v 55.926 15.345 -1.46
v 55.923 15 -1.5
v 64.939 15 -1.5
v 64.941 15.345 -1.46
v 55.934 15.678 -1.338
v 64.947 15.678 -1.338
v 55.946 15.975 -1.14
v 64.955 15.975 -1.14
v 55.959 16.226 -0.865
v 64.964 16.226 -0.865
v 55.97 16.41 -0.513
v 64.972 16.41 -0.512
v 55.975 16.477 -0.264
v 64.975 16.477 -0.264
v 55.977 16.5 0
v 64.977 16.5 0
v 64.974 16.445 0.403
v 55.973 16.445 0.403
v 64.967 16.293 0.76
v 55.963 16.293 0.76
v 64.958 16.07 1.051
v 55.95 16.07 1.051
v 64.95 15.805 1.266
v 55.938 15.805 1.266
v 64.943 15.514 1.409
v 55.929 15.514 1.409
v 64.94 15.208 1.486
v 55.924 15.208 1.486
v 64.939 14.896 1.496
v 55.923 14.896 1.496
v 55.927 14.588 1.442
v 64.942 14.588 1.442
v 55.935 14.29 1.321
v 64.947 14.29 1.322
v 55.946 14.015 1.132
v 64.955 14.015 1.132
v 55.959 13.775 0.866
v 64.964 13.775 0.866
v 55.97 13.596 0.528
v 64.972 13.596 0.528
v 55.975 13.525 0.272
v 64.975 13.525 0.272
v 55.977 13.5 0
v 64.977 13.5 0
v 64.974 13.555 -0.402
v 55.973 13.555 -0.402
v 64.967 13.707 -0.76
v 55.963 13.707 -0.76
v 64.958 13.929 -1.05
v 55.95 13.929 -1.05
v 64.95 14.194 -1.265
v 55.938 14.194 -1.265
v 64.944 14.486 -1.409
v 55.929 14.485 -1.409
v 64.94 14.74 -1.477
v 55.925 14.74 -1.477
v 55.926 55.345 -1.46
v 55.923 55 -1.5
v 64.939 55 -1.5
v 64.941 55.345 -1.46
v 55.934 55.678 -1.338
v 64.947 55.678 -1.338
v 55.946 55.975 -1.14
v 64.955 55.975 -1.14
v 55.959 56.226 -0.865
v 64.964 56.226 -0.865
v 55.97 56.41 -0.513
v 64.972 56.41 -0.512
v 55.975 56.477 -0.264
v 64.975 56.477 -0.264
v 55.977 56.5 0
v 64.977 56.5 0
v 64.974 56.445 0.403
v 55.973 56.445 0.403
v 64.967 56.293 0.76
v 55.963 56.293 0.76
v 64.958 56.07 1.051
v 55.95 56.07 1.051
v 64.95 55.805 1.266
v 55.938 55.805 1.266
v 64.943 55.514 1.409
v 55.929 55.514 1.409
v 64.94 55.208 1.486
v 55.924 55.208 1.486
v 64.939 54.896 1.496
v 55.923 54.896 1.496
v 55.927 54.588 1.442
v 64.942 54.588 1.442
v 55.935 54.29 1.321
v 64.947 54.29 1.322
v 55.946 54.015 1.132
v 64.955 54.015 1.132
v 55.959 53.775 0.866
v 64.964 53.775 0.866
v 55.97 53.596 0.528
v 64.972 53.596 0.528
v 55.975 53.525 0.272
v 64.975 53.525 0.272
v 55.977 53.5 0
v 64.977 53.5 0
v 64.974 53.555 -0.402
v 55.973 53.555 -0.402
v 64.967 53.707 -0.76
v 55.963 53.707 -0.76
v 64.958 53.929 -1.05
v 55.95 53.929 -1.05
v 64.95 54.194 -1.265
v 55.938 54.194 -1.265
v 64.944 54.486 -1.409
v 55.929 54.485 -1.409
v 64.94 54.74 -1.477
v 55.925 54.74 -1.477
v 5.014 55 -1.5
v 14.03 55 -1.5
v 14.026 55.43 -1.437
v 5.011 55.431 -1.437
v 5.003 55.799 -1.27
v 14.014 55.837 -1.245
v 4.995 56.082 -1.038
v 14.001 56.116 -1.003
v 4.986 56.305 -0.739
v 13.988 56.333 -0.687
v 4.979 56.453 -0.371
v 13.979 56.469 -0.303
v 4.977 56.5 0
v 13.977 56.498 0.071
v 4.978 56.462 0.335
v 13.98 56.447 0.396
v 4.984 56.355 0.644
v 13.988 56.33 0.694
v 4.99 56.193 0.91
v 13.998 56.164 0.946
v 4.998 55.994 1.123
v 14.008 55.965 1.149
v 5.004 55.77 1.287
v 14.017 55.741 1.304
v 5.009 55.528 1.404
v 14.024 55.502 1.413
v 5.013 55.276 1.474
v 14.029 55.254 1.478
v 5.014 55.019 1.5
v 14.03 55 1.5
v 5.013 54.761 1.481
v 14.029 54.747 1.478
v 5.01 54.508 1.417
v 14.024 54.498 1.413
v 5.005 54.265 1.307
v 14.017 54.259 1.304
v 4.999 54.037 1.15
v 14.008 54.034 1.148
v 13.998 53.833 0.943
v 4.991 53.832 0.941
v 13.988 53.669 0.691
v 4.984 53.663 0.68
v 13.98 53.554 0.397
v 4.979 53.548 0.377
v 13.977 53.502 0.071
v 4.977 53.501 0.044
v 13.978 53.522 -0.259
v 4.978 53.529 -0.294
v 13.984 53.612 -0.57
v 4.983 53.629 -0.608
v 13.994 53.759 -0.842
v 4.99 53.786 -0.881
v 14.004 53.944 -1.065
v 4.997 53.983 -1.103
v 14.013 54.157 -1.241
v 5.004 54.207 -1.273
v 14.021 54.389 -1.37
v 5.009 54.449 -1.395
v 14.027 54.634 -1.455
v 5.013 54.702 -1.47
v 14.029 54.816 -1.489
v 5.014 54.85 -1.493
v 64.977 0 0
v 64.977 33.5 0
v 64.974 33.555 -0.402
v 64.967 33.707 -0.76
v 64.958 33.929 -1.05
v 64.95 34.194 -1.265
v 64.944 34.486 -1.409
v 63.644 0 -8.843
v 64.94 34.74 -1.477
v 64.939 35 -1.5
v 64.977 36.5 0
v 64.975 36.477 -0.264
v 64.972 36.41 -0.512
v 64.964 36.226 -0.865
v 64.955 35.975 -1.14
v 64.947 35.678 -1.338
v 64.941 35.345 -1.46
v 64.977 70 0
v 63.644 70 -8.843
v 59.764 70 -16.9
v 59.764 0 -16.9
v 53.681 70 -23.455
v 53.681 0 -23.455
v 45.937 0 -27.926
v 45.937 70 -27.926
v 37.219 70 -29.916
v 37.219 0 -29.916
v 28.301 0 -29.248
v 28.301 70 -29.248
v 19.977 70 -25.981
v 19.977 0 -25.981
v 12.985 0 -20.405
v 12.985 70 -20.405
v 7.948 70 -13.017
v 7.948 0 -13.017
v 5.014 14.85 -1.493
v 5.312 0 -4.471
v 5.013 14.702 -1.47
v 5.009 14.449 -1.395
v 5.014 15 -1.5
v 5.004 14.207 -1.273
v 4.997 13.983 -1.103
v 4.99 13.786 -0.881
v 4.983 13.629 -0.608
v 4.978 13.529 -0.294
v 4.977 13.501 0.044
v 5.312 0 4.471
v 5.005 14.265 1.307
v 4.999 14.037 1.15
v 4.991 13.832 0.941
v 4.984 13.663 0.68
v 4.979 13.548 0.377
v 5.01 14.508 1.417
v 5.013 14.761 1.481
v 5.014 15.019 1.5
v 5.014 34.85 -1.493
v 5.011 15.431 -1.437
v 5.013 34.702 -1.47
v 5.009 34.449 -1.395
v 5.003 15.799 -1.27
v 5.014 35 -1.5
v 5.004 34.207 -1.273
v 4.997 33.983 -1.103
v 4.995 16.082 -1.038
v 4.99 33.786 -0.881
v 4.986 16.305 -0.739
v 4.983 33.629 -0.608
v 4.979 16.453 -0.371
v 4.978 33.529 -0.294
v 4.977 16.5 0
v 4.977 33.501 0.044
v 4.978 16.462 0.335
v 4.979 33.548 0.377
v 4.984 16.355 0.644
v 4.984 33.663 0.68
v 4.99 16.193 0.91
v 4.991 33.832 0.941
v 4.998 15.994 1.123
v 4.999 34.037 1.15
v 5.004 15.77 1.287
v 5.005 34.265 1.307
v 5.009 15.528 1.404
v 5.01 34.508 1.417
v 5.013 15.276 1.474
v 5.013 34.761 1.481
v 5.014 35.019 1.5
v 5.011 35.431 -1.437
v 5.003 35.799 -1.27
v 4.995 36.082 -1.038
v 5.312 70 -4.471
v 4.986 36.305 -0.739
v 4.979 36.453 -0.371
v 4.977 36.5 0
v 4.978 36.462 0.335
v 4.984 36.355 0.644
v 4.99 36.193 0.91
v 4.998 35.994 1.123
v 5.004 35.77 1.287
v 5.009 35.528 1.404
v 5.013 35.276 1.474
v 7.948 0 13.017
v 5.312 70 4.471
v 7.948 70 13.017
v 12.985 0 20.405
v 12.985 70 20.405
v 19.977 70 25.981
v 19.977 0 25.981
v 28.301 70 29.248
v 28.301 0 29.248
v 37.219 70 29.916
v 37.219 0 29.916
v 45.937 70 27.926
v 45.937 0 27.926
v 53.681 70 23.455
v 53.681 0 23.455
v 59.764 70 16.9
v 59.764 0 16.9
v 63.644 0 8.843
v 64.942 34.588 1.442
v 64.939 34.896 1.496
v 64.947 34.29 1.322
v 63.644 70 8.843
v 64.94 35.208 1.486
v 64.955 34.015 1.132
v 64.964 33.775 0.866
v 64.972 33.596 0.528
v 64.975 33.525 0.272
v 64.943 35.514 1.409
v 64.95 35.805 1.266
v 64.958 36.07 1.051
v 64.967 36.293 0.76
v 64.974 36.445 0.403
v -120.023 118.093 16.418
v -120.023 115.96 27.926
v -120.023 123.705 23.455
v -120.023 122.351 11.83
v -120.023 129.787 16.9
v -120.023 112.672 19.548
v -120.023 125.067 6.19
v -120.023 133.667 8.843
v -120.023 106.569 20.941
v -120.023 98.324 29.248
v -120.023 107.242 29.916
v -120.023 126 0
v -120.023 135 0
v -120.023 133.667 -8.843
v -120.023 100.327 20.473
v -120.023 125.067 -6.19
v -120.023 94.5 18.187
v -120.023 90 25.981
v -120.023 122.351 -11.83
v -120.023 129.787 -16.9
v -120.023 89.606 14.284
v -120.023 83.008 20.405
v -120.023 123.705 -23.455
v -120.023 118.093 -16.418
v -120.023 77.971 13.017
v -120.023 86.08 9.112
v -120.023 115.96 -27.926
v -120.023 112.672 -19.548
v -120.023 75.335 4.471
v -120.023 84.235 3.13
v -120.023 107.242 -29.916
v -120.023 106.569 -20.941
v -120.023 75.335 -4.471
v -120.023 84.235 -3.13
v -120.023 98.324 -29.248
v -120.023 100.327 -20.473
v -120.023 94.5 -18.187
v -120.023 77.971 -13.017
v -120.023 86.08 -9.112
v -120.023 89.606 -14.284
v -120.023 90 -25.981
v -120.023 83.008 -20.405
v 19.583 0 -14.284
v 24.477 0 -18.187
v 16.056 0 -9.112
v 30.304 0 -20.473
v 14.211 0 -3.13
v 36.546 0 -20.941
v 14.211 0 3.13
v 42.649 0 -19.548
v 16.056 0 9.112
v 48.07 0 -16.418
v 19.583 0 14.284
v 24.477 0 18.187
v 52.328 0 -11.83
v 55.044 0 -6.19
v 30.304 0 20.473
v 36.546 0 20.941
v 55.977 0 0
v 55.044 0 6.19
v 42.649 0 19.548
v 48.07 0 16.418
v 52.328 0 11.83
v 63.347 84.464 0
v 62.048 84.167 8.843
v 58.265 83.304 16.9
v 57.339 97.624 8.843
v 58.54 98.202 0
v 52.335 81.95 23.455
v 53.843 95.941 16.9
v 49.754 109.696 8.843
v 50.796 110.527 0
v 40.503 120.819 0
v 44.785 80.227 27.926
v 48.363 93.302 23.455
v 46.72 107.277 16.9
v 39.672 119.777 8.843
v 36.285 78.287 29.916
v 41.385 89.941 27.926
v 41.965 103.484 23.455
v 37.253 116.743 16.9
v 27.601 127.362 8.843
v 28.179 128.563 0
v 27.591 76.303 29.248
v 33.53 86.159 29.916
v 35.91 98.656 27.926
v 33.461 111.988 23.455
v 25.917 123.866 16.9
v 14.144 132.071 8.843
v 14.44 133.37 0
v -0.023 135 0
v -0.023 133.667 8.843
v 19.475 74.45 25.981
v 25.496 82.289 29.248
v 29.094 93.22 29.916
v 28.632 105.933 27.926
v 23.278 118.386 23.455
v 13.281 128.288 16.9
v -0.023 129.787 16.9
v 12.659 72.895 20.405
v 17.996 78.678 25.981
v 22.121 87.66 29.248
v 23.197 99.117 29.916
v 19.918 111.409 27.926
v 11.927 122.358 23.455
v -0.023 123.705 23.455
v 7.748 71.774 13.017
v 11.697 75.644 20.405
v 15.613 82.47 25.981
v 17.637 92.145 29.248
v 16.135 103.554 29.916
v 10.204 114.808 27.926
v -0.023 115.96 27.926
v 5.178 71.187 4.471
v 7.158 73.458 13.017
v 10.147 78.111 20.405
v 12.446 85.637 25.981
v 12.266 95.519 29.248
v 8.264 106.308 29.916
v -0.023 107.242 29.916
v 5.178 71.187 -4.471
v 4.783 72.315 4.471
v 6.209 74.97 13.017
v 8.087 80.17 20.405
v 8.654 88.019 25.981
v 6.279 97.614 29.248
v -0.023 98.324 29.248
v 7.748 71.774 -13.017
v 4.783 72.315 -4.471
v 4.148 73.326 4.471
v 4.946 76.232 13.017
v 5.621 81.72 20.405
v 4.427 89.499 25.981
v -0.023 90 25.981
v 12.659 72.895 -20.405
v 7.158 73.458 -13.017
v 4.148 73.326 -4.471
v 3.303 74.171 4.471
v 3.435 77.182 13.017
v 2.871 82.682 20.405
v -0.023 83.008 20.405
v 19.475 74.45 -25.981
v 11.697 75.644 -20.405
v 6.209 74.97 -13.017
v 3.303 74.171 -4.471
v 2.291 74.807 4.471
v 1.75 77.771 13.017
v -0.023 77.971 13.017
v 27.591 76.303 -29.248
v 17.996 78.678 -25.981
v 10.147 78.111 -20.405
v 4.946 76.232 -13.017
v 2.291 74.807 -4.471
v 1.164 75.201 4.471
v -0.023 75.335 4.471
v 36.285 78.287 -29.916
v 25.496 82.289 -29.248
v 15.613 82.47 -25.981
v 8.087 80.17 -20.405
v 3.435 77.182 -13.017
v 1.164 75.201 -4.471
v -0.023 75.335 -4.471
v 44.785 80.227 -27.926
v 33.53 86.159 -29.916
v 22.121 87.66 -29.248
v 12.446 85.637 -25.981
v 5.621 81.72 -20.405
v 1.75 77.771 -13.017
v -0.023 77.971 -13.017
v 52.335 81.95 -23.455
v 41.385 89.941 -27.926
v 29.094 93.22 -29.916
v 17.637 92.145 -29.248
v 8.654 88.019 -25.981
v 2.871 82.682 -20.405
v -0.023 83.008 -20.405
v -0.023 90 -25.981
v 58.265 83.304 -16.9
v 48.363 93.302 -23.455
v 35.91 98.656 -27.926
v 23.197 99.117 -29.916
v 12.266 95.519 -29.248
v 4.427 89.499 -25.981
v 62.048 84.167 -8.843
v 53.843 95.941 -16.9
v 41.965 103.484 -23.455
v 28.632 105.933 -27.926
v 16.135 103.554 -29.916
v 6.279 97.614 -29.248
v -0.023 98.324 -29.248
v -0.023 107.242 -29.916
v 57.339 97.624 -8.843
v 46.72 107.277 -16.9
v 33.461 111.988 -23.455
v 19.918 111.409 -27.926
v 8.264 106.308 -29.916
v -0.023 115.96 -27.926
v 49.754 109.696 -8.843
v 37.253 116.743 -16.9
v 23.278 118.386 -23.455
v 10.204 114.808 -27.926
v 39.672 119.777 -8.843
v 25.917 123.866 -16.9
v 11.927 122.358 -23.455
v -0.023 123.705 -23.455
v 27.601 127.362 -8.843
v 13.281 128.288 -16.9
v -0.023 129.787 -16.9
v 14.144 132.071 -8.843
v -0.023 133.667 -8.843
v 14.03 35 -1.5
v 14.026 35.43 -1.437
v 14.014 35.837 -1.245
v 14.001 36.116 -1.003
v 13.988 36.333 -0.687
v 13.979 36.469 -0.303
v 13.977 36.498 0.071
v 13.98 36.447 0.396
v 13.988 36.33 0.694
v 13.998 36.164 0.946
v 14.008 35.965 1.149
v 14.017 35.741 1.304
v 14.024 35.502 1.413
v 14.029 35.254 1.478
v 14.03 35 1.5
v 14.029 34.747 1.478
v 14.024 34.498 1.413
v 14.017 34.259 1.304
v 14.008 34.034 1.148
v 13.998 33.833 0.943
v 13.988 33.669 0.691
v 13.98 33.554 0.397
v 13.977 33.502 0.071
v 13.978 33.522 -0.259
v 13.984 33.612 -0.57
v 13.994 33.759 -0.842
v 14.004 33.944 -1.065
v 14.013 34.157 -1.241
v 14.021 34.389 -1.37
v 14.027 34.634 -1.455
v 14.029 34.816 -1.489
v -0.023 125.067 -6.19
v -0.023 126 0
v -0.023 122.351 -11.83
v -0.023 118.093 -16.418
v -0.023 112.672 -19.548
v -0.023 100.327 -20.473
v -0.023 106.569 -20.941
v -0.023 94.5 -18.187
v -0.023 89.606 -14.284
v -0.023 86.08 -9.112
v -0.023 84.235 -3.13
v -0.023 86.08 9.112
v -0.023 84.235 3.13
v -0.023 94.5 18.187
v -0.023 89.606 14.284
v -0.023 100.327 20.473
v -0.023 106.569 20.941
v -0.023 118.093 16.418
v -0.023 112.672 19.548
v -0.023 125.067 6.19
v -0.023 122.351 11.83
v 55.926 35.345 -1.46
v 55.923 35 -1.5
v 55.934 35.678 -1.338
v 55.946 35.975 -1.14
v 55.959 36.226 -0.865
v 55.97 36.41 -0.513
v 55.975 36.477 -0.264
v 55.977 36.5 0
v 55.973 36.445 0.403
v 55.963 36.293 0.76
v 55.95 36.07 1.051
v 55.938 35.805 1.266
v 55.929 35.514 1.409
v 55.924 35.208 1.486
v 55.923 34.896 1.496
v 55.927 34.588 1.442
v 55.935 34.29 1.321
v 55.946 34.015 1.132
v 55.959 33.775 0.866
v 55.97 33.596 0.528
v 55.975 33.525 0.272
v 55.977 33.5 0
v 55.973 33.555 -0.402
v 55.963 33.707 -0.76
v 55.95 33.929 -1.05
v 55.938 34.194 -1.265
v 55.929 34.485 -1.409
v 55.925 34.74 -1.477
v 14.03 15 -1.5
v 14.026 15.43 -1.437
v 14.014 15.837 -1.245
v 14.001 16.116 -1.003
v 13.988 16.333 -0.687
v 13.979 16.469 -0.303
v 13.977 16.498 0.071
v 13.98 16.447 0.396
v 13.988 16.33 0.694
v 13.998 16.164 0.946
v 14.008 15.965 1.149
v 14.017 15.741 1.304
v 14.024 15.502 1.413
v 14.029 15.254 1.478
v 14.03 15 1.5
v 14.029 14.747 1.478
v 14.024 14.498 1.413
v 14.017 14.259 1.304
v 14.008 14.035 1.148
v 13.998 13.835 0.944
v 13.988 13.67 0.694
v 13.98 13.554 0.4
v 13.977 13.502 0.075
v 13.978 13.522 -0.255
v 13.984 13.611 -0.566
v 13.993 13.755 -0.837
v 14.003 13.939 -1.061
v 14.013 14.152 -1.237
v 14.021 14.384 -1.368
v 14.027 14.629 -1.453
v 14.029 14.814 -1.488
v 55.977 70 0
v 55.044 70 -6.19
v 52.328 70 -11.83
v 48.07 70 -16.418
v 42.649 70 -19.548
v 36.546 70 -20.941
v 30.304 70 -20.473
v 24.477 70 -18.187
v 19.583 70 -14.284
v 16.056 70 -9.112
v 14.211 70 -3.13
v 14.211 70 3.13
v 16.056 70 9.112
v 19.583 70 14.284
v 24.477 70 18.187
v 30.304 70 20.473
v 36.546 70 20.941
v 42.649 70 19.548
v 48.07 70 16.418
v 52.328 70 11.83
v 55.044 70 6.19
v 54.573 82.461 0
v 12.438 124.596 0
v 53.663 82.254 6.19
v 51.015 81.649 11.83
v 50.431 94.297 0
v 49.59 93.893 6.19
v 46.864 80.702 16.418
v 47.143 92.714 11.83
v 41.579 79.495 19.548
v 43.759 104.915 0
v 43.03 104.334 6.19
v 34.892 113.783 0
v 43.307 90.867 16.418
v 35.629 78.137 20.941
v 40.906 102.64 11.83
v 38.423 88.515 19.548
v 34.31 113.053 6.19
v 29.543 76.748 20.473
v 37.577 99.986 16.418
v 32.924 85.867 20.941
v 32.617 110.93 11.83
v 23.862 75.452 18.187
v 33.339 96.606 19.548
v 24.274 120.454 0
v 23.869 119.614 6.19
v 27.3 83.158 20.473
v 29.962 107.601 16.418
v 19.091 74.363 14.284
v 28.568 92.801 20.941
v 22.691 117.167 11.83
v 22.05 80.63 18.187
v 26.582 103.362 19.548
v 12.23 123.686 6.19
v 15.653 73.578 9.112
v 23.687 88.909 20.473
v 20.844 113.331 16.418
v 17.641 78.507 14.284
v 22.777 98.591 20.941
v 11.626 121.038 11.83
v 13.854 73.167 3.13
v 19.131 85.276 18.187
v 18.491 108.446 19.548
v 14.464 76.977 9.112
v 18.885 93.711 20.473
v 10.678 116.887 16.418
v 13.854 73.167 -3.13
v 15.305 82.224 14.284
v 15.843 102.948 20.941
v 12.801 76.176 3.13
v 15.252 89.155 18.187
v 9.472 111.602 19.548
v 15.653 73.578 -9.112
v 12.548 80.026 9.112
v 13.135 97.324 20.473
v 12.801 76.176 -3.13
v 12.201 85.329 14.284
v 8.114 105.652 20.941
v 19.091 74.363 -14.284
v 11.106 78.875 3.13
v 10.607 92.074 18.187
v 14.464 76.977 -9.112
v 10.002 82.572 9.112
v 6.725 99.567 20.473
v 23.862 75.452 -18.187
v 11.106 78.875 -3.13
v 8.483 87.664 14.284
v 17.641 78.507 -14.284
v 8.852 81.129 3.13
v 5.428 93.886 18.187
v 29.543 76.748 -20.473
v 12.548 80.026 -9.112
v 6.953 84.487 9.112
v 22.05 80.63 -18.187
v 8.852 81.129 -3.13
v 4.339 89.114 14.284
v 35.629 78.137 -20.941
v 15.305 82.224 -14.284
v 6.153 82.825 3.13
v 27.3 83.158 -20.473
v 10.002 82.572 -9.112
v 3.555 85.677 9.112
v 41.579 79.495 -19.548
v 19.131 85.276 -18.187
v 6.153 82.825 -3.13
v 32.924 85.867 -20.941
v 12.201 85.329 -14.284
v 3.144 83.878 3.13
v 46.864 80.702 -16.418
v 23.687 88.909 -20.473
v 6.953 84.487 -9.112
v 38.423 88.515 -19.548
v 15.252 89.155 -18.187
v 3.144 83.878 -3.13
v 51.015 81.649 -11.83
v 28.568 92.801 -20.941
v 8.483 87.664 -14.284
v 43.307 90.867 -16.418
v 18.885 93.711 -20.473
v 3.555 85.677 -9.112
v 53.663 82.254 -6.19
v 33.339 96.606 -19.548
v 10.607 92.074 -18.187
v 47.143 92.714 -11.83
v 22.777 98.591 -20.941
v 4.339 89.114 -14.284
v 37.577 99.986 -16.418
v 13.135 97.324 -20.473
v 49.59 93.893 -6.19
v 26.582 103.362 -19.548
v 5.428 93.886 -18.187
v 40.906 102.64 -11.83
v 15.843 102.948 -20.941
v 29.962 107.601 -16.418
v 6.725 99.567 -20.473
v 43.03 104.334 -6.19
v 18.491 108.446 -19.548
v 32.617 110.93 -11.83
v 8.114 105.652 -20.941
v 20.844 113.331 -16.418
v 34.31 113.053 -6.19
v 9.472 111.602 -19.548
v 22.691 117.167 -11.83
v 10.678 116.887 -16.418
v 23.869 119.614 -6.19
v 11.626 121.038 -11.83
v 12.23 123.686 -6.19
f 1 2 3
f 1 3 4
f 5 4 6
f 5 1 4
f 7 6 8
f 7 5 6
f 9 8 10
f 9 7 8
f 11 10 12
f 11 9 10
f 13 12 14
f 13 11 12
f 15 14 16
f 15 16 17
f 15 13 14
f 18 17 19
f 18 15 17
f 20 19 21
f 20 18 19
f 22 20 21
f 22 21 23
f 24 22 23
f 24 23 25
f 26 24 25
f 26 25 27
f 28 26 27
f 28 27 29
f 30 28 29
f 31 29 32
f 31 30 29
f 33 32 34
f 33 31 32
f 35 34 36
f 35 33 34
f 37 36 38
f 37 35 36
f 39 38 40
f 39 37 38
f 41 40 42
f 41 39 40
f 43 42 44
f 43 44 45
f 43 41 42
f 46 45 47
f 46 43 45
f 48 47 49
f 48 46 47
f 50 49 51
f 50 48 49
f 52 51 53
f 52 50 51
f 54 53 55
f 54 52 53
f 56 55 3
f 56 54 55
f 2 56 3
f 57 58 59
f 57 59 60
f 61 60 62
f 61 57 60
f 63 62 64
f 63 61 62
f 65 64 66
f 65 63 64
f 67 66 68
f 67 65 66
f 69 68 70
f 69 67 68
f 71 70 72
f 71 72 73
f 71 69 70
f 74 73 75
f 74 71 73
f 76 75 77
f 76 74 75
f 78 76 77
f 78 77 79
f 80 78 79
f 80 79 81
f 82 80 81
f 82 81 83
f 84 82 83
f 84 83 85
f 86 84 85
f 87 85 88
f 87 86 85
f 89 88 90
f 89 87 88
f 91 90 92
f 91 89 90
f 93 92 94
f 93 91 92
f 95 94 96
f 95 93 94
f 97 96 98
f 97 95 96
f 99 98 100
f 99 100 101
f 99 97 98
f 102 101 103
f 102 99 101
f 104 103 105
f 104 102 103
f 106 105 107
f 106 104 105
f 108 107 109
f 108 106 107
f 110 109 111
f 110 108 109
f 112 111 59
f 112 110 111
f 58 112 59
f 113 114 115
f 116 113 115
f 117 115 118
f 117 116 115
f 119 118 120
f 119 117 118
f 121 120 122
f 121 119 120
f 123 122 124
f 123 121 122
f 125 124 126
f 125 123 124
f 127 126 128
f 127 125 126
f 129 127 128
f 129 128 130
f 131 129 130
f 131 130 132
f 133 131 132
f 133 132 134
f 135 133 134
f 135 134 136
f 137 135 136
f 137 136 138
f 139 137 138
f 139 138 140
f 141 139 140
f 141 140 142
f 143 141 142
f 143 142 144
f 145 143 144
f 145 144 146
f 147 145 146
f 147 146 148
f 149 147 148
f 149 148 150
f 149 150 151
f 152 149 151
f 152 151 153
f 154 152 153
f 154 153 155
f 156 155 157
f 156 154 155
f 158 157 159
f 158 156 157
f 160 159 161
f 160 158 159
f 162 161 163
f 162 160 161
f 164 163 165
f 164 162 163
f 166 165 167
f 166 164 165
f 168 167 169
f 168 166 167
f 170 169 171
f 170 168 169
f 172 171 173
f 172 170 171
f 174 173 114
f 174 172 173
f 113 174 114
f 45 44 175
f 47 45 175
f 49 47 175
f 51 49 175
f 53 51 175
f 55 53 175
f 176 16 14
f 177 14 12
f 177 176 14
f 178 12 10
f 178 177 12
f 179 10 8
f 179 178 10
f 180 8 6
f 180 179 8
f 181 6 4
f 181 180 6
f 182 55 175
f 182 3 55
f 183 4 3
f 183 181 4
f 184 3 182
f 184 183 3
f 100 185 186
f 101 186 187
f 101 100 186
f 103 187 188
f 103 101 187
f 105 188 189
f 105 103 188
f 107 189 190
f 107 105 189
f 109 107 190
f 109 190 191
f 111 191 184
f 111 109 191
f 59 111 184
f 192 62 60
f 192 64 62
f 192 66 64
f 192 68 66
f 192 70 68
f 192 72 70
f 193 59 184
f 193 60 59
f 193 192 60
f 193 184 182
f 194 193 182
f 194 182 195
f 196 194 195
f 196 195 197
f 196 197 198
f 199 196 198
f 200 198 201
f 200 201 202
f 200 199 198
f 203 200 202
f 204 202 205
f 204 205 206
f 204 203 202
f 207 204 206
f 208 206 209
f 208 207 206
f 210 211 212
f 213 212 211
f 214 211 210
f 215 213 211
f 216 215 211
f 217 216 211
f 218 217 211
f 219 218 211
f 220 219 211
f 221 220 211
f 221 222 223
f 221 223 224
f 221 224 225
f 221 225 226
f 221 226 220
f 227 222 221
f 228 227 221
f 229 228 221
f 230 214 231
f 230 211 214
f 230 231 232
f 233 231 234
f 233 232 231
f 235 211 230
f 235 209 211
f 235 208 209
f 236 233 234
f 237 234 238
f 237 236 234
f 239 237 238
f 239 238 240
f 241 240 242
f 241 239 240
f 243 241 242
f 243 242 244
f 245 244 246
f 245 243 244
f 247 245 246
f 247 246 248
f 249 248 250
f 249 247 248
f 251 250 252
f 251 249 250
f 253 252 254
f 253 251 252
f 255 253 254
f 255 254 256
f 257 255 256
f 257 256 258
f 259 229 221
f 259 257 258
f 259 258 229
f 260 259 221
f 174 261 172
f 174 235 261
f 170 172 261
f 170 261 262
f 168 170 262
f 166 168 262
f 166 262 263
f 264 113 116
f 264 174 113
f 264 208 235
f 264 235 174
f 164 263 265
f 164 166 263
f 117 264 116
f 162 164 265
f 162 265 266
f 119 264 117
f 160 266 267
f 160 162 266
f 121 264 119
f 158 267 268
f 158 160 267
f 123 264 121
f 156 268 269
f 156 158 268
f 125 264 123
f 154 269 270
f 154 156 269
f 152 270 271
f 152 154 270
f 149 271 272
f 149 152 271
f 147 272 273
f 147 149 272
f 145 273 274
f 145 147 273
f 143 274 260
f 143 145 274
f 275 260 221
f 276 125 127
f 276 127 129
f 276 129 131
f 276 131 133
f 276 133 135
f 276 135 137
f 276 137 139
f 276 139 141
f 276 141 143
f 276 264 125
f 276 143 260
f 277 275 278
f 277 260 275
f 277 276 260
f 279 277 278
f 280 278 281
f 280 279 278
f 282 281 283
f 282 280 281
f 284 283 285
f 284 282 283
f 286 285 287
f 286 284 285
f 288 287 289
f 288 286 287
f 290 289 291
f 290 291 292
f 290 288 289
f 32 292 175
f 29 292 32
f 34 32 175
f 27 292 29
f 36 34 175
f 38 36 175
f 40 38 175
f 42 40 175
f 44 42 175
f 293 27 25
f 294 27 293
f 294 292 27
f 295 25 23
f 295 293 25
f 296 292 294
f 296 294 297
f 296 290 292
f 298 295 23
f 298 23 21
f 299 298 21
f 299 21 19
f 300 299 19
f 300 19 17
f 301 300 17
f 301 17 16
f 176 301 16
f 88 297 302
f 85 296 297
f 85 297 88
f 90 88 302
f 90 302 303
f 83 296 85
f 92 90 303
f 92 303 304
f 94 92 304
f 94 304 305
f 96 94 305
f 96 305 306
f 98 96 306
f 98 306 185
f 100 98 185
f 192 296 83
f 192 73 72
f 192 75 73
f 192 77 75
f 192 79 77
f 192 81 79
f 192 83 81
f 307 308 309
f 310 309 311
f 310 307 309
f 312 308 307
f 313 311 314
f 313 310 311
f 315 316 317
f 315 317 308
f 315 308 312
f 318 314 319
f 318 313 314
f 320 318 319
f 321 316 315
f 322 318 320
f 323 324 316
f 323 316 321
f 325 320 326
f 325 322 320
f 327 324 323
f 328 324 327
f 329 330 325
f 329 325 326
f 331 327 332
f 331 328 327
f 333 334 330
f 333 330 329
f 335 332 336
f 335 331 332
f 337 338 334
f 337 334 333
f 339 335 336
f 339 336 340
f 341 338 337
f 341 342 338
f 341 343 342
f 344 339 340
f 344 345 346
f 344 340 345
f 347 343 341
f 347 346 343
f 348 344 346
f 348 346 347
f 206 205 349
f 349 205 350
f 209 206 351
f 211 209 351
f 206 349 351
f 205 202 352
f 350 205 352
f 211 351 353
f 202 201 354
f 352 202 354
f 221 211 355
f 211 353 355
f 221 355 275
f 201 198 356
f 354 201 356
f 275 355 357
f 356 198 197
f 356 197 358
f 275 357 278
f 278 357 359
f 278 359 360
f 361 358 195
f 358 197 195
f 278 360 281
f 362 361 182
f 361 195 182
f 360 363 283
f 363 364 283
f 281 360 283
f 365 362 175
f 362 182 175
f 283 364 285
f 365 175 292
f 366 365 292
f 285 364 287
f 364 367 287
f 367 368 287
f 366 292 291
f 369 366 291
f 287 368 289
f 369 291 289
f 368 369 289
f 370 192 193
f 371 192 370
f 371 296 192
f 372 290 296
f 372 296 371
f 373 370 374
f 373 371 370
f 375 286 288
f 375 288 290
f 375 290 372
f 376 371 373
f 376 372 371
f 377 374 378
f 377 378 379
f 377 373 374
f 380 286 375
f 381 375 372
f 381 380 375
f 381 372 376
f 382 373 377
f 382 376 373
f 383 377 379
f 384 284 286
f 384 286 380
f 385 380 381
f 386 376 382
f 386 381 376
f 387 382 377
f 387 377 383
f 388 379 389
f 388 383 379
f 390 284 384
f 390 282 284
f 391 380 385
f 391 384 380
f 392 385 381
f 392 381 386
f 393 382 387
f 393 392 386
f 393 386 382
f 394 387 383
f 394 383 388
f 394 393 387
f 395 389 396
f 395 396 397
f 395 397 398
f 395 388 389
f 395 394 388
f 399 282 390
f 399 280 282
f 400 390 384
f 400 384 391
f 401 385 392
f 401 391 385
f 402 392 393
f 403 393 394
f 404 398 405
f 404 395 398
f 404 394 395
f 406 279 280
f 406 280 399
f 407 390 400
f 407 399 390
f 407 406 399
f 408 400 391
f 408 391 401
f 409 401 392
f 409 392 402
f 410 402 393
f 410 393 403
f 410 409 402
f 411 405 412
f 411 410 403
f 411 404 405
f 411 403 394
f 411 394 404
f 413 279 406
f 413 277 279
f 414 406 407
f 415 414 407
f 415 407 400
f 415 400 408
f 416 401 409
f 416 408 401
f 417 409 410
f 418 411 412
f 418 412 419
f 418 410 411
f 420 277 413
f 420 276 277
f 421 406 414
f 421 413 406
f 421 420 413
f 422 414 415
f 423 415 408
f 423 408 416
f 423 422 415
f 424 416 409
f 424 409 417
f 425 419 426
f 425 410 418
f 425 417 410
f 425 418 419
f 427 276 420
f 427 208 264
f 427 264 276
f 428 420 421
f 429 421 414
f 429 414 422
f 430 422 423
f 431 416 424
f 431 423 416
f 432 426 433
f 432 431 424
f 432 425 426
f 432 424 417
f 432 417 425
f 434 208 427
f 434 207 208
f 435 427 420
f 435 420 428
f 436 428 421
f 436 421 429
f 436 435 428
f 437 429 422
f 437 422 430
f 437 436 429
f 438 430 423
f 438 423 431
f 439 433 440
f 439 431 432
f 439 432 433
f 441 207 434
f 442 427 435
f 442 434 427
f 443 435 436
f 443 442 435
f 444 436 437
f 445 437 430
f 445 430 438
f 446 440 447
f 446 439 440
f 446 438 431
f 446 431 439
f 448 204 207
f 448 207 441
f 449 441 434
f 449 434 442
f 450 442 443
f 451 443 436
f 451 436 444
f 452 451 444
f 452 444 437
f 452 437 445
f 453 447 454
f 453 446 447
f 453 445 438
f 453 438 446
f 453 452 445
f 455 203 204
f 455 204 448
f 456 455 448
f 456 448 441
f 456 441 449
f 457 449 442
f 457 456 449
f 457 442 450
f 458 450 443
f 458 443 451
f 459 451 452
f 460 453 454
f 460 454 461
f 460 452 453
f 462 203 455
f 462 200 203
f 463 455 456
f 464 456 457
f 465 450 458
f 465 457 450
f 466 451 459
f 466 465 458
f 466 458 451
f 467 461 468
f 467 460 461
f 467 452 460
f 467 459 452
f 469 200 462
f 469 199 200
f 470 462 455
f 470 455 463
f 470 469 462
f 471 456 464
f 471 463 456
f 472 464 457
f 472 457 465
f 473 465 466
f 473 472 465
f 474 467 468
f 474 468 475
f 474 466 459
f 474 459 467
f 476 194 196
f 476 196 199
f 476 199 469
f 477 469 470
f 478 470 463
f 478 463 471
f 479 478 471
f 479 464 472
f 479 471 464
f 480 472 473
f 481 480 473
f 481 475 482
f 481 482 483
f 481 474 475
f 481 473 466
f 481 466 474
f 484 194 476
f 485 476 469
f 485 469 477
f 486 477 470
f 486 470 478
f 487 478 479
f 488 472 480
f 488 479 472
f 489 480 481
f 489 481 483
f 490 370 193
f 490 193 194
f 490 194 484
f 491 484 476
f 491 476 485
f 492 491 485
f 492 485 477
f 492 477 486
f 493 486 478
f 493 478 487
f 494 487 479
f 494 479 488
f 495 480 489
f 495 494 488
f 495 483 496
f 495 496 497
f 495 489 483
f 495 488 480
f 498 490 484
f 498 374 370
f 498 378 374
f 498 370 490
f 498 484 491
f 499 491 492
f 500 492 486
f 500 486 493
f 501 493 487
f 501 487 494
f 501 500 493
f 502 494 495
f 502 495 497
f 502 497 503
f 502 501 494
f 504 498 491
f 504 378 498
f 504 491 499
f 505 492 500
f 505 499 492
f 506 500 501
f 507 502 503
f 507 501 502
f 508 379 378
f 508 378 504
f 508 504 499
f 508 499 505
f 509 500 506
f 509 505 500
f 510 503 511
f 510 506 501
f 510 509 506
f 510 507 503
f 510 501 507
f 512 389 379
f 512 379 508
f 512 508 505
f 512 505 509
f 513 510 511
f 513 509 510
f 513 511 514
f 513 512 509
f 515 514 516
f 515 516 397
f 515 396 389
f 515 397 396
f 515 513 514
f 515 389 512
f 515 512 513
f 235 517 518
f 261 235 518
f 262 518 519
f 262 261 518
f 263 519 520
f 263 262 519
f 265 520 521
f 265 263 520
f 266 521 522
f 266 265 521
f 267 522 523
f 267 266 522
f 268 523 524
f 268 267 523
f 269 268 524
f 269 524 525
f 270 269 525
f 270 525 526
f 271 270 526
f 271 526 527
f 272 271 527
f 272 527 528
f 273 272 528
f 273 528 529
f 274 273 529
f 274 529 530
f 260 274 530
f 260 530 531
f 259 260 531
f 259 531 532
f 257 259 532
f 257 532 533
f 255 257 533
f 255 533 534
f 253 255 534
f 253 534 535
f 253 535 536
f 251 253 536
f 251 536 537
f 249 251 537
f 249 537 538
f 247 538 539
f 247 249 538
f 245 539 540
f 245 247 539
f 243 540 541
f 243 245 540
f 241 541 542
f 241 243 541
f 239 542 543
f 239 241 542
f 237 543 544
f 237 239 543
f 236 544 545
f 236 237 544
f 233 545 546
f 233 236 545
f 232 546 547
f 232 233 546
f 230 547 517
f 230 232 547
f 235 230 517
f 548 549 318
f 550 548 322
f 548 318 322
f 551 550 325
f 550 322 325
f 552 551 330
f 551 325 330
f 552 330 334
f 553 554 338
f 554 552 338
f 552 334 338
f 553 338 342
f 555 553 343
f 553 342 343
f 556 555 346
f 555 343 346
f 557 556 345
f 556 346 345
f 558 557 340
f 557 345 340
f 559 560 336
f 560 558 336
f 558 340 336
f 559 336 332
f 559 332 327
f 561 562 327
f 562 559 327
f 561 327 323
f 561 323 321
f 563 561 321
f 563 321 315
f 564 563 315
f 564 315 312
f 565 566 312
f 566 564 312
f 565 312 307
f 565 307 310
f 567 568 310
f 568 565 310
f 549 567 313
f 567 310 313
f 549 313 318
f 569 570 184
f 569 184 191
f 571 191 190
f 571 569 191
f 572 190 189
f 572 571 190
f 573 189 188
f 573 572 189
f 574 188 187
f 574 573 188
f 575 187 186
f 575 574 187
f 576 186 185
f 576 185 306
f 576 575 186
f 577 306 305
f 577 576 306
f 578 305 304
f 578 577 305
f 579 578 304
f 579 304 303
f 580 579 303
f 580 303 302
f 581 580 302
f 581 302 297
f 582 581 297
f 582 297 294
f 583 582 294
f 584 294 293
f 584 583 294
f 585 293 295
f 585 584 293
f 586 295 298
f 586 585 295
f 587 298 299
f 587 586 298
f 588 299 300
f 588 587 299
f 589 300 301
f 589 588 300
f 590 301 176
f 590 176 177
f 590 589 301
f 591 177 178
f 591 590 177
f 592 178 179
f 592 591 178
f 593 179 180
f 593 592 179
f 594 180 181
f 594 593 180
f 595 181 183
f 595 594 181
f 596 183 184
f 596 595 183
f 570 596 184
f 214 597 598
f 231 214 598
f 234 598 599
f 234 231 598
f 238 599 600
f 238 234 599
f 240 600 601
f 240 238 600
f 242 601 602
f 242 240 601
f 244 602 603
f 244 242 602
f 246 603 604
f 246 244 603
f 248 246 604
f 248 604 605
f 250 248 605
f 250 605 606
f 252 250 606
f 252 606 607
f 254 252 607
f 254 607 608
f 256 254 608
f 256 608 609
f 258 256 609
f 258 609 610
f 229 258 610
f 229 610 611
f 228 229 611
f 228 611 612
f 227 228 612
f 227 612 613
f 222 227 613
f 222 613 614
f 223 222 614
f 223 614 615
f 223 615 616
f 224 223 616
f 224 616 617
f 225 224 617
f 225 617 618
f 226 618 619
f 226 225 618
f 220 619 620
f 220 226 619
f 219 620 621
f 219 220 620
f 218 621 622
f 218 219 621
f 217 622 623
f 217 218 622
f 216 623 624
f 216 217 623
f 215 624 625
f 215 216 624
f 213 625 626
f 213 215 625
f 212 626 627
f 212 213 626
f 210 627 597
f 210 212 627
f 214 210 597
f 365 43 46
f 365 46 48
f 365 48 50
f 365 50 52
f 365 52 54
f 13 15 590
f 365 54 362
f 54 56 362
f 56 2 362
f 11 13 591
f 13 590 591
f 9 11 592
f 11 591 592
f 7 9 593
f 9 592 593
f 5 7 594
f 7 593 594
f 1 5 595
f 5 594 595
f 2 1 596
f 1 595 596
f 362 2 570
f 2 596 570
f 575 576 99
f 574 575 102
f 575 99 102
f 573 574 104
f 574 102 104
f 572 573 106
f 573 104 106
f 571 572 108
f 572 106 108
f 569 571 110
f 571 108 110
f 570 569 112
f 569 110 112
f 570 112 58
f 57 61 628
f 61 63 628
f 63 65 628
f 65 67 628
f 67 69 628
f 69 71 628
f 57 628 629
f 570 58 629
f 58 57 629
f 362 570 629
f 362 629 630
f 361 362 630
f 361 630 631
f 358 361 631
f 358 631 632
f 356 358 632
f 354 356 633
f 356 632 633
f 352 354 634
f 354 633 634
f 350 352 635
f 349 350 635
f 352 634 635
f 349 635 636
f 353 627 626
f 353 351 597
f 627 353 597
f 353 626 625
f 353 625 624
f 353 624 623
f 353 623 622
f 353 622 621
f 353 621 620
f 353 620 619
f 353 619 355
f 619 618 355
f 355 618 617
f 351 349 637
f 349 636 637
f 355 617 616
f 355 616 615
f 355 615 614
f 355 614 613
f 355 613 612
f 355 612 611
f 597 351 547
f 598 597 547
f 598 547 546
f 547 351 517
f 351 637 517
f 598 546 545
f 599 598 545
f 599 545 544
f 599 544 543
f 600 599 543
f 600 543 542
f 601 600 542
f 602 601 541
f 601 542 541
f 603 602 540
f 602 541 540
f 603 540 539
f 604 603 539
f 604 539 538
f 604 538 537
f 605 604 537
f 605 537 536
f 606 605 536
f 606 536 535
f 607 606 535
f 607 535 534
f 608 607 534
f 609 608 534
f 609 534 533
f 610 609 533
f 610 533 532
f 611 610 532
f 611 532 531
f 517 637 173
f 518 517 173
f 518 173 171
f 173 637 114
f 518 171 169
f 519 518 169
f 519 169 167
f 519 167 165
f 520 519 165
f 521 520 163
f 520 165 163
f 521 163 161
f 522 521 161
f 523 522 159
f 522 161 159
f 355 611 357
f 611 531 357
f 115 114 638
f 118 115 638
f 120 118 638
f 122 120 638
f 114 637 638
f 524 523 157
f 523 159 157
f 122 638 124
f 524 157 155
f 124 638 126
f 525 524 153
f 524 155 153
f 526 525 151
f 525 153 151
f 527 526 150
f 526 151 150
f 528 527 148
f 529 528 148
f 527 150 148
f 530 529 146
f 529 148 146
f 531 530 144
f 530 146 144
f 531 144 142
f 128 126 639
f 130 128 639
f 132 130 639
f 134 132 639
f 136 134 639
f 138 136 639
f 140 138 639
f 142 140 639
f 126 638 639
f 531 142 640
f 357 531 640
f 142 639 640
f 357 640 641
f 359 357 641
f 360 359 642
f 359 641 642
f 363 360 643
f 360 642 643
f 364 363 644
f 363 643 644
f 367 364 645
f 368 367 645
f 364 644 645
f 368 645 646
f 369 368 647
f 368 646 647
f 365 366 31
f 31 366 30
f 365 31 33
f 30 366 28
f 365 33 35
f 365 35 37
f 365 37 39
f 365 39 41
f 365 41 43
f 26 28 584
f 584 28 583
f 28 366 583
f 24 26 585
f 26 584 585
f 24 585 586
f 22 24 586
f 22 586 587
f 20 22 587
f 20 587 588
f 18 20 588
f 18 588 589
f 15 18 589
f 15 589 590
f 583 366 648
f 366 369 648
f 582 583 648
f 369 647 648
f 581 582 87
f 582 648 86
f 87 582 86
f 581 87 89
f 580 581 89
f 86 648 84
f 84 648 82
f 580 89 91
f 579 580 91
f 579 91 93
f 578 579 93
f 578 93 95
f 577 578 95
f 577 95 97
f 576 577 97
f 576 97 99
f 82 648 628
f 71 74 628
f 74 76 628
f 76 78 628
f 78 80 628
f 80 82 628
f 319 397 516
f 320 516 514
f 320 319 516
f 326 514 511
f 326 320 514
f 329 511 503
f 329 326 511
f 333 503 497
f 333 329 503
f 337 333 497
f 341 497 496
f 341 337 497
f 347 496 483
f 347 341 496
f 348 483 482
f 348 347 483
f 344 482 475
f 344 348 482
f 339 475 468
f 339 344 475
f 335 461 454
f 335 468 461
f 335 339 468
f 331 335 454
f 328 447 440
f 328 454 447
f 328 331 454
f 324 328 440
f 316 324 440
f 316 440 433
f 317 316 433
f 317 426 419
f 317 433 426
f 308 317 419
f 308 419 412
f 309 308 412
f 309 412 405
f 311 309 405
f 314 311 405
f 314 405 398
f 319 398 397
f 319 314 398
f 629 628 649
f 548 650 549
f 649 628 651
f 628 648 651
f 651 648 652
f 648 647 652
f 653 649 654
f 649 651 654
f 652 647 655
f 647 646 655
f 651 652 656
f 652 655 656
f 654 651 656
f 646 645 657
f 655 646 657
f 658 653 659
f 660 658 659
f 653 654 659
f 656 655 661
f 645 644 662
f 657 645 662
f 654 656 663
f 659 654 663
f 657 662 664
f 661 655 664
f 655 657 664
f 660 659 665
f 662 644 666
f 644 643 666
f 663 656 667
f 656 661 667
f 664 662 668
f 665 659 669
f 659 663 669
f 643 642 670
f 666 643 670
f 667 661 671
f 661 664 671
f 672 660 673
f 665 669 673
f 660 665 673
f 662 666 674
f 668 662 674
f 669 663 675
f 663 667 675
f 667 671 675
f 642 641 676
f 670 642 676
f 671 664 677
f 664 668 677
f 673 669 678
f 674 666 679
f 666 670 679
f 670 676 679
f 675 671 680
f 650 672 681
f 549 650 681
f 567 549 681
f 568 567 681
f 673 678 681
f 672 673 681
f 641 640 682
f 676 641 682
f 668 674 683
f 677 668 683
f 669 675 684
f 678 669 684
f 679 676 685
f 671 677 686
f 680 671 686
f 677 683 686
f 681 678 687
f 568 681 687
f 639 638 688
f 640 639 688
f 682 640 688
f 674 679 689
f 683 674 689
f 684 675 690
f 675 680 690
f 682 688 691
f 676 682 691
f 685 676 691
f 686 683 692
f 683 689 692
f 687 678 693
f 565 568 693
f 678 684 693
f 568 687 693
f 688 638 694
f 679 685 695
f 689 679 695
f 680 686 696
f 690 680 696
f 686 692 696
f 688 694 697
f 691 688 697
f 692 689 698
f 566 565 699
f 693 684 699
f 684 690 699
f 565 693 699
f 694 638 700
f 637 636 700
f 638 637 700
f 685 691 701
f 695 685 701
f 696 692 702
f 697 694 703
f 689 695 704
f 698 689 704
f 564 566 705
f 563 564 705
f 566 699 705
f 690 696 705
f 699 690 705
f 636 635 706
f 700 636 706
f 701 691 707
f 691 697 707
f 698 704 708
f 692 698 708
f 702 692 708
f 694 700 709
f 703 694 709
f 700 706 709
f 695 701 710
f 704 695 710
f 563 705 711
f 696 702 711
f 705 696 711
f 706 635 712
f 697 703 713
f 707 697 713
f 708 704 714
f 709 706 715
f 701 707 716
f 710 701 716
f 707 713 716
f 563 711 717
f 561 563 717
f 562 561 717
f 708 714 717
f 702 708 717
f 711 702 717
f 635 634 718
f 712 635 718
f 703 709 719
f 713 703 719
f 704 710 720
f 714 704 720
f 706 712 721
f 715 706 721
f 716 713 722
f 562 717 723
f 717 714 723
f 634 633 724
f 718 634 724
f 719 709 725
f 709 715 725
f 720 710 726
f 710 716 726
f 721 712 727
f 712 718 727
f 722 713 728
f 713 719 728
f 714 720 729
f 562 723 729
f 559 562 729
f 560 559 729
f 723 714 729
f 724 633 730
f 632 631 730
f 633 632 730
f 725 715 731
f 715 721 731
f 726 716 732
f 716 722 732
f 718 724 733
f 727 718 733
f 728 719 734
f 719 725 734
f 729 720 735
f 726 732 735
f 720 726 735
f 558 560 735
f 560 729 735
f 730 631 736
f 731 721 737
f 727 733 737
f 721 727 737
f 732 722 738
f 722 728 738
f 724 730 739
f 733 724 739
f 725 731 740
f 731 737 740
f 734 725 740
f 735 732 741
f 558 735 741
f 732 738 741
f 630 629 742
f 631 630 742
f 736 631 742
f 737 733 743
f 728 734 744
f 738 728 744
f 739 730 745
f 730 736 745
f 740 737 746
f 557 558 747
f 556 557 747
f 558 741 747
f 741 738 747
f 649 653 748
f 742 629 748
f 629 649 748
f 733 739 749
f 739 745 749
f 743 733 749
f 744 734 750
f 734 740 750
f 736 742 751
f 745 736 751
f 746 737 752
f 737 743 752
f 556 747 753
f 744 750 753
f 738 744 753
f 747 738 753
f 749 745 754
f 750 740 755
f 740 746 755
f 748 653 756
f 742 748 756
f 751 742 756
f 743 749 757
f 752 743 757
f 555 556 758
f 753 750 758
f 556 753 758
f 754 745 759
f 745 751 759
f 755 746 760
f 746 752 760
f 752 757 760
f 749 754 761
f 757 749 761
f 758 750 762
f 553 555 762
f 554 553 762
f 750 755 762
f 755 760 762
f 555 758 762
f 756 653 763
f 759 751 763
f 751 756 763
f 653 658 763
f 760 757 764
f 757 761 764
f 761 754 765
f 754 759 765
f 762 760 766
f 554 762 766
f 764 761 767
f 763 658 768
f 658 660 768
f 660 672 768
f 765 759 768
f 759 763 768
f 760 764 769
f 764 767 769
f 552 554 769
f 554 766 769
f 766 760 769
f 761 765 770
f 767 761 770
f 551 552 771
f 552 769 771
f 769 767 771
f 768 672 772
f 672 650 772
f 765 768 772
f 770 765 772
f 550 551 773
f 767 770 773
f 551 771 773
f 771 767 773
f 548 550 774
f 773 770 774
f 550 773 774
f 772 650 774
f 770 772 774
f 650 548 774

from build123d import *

# Parameters (mm, degrees)
SKETCH2_R               = 30
SHELL15_T               = -9
CUT_EXTRUDE2_DEPTH      = 184.113665481
CUT_EXTRUDE2_DEPTH_BACK = 184.113665481
SKETCH4_R               = 1.5


with BuildPart() as part:
    # Sweep1: sweep along a path in Sketch1
    with BuildLine(Plane.XY) as sweep1_path:
        Line((34.976608727, 0), (34.976608727, 70))
        ThreePointArc((34.976608727, 70), (24.725346068, 94.748737342), (-0.023391273, 105))
        Line((-0.023391273, 105), (-120.023391273, 105))
    # Sketch2 → Sweep1 (sweep)
    with BuildSketch(Plane(origin=(0, 0, 0), x_dir=(1, 0, 0), z_dir=(0, 1, 0))):
        with Locations((34.976608727, 0)):
            Circle(SKETCH2_R)
    sweep(path=sweep1_path.line)

    # Shell15
    shell15_openings = [part.faces().sort_by_distance(p)[0] for p in [
        (-120.023391273, 105, 0),
        (34.976608727, 0, 0),
    ]]
    offset(amount=SHELL15_T, openings=shell15_openings, kind=Kind.INTERSECTION)

    # Sketch4 → Cut-Extrude2 (cut, two sides: drawn at the far end of the back side and taken through both)
    with BuildSketch(Plane(origin=(0, 0, 0), x_dir=(0, 0, -1), z_dir=(1, 0, 0)).offset(-CUT_EXTRUDE2_DEPTH_BACK)):
        with Locations((0, 35)):
            Circle(SKETCH4_R)
        with Locations((0, 55)):
            Circle(SKETCH4_R)
        with Locations((0, 15)):
            Circle(SKETCH4_R)
    extrude(amount=CUT_EXTRUDE2_DEPTH + CUT_EXTRUDE2_DEPTH_BACK, mode=Mode.SUBTRACT)


solid = part.part
